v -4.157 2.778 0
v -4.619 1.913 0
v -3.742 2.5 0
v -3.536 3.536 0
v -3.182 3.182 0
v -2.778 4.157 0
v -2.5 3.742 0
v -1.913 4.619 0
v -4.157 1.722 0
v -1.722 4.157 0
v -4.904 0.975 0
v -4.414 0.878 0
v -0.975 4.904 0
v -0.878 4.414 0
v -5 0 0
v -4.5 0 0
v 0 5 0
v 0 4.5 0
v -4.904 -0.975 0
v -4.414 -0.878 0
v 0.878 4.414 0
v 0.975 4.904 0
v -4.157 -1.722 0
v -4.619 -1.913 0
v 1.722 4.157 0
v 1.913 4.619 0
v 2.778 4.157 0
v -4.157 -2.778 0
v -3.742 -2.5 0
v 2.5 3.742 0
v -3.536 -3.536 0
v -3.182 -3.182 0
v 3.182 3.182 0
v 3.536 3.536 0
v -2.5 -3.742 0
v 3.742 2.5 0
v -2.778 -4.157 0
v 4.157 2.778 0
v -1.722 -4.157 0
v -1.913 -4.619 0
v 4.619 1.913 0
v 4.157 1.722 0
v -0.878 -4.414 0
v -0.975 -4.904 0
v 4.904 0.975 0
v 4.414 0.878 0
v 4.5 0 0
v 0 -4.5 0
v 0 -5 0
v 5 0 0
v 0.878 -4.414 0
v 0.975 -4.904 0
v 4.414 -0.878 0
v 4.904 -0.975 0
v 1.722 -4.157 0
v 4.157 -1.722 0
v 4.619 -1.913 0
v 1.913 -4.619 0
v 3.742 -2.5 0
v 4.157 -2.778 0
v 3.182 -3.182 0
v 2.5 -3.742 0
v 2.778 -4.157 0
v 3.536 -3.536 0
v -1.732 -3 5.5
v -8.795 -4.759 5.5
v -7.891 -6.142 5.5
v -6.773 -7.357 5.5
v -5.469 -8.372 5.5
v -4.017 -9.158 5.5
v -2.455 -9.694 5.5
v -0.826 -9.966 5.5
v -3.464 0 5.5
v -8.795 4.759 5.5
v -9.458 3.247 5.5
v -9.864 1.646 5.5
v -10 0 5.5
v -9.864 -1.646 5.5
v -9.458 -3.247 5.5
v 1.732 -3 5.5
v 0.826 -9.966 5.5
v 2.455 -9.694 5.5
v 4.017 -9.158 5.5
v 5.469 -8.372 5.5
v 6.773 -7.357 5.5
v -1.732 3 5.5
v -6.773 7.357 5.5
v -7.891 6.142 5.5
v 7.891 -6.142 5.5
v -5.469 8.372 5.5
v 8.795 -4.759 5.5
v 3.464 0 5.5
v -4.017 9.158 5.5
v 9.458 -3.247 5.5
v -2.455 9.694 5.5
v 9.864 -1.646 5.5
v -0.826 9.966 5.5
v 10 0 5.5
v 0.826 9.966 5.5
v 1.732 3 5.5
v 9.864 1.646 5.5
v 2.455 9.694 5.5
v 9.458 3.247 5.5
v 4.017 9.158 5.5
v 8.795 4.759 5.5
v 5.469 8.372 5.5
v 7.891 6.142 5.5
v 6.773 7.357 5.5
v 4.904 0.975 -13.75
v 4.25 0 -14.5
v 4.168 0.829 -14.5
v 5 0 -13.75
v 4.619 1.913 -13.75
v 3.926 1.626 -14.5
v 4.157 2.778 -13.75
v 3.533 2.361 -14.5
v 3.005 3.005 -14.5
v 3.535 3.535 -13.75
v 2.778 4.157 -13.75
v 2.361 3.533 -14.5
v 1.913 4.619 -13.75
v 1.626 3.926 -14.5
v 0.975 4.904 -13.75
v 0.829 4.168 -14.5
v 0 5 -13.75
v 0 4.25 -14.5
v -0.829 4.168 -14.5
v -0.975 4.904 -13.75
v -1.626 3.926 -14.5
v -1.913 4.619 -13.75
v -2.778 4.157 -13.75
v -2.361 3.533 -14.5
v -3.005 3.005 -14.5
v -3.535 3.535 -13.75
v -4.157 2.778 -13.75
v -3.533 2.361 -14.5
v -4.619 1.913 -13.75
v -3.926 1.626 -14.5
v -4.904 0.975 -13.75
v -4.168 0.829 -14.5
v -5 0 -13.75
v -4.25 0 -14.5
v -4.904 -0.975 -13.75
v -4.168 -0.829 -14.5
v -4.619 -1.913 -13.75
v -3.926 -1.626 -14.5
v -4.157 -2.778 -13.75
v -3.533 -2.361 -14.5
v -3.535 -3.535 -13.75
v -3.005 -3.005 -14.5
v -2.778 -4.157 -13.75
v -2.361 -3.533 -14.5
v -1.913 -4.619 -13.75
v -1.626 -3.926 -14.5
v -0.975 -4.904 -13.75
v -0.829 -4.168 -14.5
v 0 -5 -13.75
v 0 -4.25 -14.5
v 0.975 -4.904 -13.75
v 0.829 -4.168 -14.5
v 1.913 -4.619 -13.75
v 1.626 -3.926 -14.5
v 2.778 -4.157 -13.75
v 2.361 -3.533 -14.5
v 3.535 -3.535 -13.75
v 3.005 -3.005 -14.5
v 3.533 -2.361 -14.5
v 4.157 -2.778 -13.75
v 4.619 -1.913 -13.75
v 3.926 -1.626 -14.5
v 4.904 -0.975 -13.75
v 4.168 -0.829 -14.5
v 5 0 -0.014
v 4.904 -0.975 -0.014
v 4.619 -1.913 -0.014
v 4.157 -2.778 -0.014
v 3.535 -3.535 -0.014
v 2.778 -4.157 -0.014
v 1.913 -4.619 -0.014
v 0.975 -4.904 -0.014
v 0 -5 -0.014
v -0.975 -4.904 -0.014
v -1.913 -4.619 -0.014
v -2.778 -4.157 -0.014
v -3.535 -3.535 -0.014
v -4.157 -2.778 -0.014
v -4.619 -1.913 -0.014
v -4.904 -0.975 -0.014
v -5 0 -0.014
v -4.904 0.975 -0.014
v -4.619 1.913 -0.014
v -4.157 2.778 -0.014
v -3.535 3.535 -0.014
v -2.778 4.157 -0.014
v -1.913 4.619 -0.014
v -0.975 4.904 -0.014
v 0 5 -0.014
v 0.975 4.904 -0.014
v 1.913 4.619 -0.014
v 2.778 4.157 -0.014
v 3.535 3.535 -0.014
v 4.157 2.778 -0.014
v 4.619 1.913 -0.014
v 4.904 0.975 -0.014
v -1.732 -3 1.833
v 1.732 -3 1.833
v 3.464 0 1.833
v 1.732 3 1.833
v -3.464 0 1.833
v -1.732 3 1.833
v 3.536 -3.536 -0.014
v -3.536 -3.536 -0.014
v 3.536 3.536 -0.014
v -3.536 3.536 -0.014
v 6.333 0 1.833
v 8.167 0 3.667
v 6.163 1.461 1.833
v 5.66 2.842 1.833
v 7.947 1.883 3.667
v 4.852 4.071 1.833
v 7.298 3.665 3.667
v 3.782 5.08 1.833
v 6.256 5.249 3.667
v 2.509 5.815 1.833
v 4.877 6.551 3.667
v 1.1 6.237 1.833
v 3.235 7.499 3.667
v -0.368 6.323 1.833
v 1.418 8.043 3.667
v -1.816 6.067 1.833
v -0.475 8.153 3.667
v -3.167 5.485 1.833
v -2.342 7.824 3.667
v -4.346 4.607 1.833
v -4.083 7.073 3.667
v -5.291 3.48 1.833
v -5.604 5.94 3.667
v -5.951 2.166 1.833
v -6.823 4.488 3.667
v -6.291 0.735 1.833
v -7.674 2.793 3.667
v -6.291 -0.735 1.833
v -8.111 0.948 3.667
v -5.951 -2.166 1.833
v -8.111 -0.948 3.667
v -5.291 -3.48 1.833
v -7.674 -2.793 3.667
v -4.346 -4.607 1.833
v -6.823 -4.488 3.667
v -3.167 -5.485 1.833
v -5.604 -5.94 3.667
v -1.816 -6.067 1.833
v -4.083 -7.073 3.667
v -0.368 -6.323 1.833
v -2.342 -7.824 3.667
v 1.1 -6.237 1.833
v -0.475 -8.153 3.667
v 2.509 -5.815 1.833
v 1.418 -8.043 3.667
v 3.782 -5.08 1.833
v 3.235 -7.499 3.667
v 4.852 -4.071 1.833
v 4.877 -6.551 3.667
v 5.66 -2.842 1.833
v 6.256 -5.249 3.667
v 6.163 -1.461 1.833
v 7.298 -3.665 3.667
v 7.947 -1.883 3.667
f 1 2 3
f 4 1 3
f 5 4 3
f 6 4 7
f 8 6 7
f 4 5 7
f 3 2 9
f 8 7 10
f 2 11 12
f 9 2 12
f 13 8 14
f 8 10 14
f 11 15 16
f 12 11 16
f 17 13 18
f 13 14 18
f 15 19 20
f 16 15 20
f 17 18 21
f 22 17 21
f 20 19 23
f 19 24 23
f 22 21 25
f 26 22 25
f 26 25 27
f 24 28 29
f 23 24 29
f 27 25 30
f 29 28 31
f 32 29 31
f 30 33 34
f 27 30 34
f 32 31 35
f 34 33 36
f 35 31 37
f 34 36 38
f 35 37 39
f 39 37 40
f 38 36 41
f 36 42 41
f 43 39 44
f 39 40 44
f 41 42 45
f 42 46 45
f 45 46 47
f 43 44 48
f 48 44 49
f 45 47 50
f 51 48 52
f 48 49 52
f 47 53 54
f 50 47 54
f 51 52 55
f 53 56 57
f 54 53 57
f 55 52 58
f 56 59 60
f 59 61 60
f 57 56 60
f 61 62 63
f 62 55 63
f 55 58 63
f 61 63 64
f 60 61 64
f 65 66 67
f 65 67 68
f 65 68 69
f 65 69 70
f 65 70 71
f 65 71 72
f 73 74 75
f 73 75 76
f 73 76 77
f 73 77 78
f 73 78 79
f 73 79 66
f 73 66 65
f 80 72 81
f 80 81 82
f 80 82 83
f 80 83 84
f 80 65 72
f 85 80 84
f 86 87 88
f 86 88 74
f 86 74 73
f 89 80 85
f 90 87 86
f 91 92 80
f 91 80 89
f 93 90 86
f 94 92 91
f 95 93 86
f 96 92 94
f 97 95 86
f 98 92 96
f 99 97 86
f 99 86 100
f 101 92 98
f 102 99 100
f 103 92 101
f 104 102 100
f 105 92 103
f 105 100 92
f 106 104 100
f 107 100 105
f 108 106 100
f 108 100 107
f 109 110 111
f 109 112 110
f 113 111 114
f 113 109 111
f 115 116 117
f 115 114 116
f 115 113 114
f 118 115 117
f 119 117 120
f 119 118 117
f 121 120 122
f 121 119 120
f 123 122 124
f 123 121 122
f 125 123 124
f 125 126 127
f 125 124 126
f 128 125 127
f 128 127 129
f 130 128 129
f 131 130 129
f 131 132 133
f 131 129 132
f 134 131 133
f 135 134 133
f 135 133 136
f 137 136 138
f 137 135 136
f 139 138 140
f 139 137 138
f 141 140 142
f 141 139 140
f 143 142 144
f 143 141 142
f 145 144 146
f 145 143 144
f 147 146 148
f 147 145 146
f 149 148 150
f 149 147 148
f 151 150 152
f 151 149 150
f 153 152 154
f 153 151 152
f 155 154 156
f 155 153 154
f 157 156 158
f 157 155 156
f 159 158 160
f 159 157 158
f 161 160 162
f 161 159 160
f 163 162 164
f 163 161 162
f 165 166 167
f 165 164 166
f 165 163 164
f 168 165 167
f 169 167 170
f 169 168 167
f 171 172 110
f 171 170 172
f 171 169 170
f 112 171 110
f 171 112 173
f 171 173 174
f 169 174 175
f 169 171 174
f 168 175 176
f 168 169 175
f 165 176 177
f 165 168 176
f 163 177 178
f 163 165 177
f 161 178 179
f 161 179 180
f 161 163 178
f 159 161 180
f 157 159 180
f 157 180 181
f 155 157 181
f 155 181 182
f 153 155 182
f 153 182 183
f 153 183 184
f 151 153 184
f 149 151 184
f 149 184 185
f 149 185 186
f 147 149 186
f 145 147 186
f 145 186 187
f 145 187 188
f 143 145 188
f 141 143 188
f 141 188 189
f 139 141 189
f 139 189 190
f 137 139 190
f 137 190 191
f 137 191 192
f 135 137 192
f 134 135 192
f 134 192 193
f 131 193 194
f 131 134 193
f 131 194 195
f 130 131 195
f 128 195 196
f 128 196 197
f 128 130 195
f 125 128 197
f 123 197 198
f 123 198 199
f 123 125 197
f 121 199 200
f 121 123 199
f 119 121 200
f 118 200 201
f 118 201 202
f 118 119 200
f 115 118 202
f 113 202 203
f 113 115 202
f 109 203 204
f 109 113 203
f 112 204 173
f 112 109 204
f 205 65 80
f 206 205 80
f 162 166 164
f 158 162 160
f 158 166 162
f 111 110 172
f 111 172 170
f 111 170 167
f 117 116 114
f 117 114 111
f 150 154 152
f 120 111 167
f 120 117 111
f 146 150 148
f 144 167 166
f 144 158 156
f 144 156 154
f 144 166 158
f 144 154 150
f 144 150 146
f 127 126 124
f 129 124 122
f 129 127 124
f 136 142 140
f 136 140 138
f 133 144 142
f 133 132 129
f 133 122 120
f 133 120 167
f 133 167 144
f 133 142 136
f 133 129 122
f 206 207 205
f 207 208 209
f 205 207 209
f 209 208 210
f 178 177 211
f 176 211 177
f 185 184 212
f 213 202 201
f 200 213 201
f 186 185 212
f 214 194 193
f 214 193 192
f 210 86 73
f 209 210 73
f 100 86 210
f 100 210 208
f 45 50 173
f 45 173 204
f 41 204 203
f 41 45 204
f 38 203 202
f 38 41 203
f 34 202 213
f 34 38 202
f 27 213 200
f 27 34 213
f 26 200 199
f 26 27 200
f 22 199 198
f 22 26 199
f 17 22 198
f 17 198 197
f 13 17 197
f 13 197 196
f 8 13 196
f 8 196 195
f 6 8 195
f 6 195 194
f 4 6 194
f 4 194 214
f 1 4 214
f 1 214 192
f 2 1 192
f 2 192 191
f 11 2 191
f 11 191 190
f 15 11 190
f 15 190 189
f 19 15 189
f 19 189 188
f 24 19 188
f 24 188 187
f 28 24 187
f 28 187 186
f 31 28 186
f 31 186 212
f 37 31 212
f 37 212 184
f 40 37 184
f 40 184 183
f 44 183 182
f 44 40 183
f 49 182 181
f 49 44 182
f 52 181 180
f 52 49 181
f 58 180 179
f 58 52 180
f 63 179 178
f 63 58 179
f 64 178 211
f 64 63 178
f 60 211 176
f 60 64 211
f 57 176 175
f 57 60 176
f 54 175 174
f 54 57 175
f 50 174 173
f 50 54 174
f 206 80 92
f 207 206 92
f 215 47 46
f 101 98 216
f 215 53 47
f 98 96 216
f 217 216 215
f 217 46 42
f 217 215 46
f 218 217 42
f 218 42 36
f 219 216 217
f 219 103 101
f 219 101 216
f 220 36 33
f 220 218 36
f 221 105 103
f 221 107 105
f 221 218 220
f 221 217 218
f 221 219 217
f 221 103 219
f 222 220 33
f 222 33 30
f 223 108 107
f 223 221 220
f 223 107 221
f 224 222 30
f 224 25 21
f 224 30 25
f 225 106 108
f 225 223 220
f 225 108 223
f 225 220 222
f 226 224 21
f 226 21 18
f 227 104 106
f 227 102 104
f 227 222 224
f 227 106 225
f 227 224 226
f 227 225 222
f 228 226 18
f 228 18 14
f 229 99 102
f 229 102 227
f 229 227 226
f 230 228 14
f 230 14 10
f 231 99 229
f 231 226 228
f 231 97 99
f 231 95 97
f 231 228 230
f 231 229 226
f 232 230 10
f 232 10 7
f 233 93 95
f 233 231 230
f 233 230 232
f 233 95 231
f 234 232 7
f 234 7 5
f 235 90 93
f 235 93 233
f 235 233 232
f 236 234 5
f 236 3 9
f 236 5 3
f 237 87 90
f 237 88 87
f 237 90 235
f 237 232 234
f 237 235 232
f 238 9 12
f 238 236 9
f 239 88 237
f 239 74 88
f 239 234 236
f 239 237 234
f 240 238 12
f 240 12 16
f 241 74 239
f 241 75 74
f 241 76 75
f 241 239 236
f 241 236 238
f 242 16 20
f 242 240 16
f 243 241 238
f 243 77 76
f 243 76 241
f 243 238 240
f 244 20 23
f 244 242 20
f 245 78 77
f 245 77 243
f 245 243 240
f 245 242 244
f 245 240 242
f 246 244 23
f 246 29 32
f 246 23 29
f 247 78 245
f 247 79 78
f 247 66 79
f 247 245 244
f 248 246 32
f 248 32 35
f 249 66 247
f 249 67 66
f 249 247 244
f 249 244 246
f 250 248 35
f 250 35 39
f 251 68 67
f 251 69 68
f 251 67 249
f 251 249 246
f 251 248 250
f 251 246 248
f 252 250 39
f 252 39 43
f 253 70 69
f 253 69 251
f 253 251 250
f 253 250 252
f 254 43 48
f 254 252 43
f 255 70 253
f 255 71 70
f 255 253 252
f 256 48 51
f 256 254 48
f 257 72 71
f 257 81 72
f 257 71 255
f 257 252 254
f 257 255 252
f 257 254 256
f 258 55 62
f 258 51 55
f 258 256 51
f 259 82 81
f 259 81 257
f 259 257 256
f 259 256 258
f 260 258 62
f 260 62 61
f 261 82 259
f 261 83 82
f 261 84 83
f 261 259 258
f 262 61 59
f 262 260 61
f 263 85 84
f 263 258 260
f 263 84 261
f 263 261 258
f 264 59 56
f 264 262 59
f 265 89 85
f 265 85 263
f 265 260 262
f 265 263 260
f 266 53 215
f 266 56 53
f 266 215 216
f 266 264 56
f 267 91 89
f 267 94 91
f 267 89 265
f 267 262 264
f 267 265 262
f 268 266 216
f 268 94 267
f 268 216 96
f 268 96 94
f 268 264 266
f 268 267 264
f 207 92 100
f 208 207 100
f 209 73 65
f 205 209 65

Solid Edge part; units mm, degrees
sketch "Sketch1" plane through (0, 0, 0) normal (0, 0, 1) x (1, 0, 0)
  circle A0 centre (0, 0) radius 10
  dimension "D1" = 20
extrude "Protrusion1" add sketch "Sketch1" along normal blind 5.5
sketch "Sketch2" plane through (0, 0, 0) normal (0, 0, -1) x (1, 0, 0)
  circle A0 centre (0, 0) radius 5
extrude "Protrusion2" add sketch "Sketch2" along normal blind 14.5
sketch "Sketch3" plane through (0, 0, -14.5) normal (0, 0, -1) x (1, 0, 0)
  circle A0 centre (0, 0) radius 4.9997
extrude "Cutout1" cut sketch "Sketch3" against normal blind 14.4855 flip side to cut
chamfer "Chamfer_1" distance 0.75 angle 45 1 edges at (-4.9997, 0, -14.5)
sketch "Sketch4" plane through (0, 0, 5.5) normal (0, 0, 1) x (1, 0, 0)
  line L0 (-1.7321, 3) -> (1.7321, 3)
  line L1 (3.4641, 0) -> (1.7321, 3)
  line L2 (1.7321, -3) -> (3.4641, 0)
  line L3 (-1.7321, -3) -> (1.7321, -3)
  line L4 (-3.4641, 0) -> (-1.7321, -3)
  line L5 (-1.7321, 3) -> (-3.4641, 0)
  dimension "D1" = 6
extrude "Cutout2" cut sketch "Sketch4" against normal blind 3.6667
sketch "Sketch5" plane through (0, 0, 0) normal (0, -1, 0) x (1, 0, 0)
  line L0 (10, 5.5) -> (4.5, 0)
  line L1 (4.5, 0) -> (10, 0)
  line L2 (10, 0) -> (10, 5.5)
revolve "RevolvedCutout1" cut sketch "Sketch5" angle 360 about axis through (0, 0, 14.0017) along (0, 0, -1)
properties part number "185736" material "Stainless Steel, 304"
